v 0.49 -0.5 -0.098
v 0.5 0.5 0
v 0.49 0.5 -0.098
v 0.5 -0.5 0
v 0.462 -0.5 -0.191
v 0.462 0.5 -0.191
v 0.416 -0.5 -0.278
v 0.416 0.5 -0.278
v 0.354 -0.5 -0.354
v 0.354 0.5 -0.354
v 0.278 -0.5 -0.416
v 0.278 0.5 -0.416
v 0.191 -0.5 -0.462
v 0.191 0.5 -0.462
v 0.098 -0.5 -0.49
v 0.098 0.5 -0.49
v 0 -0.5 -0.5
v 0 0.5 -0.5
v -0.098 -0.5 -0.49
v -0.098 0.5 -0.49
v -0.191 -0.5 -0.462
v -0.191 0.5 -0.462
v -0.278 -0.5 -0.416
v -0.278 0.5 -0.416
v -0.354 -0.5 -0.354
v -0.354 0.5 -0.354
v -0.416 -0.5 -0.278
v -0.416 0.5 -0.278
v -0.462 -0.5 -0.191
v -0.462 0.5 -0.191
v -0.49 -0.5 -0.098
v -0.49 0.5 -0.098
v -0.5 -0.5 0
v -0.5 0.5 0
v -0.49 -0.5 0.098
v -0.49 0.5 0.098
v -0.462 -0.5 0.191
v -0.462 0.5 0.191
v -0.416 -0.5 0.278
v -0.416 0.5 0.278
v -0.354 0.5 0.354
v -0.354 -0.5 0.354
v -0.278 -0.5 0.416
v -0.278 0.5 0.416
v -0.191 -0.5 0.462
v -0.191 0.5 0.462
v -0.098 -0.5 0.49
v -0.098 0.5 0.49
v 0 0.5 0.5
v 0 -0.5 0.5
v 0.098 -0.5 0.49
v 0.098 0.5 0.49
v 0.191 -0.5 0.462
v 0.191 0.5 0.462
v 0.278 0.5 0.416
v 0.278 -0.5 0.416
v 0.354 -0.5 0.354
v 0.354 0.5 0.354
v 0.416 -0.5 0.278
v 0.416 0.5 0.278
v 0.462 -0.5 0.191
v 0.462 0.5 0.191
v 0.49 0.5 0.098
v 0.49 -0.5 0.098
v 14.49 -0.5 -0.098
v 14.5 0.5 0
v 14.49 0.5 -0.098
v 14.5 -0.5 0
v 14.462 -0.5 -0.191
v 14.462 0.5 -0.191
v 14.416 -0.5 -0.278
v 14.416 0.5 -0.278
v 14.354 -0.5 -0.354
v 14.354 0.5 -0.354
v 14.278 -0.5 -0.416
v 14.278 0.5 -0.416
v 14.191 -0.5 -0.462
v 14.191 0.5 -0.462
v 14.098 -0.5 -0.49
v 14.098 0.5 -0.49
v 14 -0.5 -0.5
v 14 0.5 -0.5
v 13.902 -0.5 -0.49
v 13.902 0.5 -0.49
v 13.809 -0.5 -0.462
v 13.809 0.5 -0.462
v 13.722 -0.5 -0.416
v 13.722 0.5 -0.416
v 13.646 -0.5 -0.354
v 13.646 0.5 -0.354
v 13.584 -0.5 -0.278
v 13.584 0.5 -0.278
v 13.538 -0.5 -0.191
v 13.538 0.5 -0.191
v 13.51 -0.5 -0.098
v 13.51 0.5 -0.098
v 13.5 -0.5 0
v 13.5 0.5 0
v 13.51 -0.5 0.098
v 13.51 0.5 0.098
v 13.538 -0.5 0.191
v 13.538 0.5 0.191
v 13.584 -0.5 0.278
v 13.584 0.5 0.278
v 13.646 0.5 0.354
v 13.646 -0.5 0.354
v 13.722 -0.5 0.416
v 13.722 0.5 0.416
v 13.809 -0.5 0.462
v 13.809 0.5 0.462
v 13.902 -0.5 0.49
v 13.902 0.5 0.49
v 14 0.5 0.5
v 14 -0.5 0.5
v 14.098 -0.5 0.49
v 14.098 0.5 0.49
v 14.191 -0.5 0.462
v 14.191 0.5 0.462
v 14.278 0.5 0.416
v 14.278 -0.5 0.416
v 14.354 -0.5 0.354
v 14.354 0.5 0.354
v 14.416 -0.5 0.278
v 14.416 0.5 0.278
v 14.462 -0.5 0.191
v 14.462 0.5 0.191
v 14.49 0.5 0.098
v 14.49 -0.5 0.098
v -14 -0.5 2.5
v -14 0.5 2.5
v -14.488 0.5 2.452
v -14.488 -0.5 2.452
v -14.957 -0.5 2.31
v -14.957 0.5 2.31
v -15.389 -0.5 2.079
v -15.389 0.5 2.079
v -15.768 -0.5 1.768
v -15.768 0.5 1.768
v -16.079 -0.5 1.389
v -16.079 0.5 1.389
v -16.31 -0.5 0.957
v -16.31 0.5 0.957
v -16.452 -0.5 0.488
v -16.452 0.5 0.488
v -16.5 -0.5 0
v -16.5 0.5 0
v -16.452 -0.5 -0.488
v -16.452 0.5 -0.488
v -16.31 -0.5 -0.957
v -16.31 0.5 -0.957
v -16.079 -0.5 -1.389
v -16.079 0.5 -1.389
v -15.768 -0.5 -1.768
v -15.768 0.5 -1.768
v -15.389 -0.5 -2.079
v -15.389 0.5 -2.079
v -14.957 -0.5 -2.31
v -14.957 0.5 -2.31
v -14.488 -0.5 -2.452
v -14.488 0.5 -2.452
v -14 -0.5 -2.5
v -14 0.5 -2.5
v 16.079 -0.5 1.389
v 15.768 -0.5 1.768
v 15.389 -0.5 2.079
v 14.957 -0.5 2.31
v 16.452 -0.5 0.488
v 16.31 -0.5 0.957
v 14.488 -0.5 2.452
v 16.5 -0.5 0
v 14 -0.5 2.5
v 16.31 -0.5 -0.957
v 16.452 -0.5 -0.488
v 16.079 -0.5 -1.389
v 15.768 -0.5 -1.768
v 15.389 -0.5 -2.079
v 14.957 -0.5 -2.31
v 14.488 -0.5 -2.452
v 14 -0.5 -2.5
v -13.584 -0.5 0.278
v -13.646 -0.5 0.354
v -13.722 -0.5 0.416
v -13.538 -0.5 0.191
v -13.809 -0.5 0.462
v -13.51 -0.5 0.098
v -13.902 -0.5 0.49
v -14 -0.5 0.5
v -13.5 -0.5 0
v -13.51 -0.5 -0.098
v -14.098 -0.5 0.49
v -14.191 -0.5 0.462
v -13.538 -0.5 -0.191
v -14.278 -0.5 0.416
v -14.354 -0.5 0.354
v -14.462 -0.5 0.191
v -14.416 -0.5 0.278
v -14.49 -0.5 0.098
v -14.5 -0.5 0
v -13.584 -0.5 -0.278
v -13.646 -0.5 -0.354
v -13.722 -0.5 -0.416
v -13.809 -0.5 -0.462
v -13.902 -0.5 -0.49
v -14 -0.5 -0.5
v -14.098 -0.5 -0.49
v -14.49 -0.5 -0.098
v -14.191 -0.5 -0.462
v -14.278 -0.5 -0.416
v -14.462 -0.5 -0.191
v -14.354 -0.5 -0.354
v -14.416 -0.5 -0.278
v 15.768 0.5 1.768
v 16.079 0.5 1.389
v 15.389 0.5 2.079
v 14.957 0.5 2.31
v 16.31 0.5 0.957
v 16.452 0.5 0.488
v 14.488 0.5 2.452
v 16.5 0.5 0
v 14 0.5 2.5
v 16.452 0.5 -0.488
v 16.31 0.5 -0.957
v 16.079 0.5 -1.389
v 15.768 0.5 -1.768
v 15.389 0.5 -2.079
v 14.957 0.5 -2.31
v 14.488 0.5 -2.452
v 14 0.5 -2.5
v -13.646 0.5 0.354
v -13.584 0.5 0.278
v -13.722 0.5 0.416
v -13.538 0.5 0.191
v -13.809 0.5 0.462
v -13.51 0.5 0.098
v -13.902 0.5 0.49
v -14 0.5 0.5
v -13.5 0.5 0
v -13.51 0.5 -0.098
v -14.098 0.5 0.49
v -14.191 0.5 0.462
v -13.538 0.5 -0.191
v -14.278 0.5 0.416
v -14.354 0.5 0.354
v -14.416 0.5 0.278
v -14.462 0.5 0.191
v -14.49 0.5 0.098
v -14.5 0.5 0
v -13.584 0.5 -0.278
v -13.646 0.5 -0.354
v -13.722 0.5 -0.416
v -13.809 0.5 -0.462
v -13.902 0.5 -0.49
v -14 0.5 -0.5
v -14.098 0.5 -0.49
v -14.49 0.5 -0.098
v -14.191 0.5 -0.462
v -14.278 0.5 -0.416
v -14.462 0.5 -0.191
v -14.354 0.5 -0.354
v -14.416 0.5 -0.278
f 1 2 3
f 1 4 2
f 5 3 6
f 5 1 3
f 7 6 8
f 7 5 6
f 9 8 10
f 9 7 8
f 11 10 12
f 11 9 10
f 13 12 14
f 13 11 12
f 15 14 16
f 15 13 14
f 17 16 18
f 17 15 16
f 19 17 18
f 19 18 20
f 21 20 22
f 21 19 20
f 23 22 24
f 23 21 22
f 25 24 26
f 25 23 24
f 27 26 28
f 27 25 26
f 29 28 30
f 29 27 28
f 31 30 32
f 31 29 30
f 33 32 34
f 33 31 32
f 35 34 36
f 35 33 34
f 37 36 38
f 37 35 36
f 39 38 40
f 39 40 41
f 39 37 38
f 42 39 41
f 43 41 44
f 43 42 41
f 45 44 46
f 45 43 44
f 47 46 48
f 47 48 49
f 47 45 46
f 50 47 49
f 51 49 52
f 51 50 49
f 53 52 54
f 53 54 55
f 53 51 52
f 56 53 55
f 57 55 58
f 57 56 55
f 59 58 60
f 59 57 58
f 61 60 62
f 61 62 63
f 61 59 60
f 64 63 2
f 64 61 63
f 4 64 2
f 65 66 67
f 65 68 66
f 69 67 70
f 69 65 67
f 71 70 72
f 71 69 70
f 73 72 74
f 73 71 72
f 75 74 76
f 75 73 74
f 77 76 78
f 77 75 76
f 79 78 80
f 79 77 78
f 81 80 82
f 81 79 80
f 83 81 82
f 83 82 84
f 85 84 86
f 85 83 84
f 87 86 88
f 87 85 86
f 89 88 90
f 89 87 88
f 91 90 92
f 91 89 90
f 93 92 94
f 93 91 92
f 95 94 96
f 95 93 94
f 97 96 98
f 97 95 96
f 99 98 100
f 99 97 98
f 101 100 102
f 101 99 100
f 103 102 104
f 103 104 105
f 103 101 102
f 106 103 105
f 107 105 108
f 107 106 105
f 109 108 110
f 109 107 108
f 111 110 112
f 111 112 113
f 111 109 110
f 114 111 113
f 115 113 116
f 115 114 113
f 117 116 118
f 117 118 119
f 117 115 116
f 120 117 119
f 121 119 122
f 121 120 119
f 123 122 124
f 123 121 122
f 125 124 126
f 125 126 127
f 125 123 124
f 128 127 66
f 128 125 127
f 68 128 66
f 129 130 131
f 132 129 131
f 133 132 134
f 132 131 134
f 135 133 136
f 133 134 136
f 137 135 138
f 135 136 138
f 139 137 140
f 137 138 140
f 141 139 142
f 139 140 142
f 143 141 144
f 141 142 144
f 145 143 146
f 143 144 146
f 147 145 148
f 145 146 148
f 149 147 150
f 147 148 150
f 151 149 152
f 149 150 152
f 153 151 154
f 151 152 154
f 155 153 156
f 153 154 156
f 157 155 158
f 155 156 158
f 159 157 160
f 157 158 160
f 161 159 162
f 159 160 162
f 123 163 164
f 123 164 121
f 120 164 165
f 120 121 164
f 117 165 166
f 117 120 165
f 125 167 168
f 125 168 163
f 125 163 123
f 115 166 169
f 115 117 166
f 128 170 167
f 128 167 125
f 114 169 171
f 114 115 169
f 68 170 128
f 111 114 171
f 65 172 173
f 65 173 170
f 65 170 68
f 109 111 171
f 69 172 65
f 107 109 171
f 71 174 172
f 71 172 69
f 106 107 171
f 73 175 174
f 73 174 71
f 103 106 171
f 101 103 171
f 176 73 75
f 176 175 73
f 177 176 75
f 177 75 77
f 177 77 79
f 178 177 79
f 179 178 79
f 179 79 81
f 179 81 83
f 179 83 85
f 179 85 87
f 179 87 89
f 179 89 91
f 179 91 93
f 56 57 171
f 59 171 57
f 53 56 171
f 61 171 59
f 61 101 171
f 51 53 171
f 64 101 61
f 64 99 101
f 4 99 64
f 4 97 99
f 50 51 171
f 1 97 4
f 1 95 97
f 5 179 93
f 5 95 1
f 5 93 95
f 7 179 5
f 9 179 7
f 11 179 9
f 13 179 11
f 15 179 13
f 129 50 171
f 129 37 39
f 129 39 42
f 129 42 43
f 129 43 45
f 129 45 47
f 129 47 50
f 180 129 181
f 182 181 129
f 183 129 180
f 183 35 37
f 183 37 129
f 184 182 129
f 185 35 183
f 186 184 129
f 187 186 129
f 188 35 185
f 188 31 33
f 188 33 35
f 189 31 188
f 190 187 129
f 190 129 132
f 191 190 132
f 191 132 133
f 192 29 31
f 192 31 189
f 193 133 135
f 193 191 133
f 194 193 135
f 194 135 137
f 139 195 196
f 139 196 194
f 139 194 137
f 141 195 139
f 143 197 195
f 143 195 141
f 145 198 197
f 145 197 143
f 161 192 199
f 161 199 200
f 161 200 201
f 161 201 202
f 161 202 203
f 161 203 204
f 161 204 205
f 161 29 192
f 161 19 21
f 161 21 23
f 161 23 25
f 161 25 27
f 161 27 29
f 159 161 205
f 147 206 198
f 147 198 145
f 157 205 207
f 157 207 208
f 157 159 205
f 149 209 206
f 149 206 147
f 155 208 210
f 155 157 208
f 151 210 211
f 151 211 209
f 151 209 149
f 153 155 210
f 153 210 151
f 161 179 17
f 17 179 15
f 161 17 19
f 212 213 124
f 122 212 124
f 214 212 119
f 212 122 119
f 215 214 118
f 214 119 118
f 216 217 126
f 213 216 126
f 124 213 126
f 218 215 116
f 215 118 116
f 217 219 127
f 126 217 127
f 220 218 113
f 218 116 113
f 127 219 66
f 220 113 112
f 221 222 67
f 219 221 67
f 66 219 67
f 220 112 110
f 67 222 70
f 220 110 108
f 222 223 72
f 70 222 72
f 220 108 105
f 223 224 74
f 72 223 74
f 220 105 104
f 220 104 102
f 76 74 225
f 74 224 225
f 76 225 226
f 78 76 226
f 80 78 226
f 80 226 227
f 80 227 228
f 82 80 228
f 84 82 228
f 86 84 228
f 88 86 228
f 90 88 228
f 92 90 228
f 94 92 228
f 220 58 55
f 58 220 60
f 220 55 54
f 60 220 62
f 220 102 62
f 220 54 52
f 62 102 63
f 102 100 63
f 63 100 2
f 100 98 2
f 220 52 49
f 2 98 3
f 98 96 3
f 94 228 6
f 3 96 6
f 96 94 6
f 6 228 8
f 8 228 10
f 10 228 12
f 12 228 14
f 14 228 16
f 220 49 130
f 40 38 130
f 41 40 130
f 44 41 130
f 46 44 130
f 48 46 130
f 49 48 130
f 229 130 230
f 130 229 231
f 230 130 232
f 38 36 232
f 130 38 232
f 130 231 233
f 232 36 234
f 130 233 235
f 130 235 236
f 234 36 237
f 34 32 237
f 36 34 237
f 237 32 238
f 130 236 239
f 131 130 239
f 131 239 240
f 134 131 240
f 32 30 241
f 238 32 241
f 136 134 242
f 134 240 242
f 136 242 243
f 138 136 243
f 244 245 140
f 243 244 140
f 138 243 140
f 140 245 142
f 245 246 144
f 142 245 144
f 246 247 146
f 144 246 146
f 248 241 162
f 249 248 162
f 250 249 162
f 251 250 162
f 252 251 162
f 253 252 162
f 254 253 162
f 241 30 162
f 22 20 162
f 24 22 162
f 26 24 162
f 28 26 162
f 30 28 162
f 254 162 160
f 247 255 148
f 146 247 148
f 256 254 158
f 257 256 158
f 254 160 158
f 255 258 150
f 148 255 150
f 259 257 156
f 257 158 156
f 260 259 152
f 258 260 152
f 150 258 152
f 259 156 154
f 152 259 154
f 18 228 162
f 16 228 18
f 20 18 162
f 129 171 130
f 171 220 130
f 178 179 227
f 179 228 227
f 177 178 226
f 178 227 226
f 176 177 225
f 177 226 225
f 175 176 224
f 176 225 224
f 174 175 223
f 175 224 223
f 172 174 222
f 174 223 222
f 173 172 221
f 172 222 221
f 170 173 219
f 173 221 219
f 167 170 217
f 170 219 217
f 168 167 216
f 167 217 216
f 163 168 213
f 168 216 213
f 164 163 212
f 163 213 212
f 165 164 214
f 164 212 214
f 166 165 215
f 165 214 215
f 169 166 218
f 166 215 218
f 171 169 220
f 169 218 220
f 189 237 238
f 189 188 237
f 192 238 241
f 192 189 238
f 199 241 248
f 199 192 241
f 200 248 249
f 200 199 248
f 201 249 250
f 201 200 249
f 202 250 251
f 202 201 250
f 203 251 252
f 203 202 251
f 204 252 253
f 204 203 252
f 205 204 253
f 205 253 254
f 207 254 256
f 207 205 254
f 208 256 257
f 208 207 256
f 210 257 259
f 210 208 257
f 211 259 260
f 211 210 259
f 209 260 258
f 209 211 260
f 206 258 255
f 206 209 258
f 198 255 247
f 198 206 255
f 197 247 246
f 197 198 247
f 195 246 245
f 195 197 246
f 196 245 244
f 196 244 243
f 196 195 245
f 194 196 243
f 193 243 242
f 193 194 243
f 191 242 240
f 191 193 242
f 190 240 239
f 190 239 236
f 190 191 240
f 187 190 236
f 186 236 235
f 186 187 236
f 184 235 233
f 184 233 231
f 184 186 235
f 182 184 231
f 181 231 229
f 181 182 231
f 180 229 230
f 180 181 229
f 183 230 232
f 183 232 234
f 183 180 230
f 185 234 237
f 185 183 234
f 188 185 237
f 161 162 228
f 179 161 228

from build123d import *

# Parameters (mm, degrees)
SCHIZZO1_R                   = 0.5
ESTRUSIONE_ESTRUSIONE3_DEPTH = 0.5


with BuildPart() as part:
    # Schizzo1 → Estrusione-Estrusione3 (new body, symmetric)
    with BuildSketch(Plane(origin=(0, 0, 0), x_dir=(1, 0, 0), z_dir=(0, 1, 0))):
        with BuildLine():
            Line((-14, 2.5), (14, 2.5))
            ThreePointArc((14, 2.5), (16.5, 0), (14, -2.5))
            Line((14, -2.5), (-14, -2.5))
            ThreePointArc((-14, -2.5), (-16.5, 0), (-14, 2.5))
        make_face()
        Circle(SCHIZZO1_R, mode=Mode.SUBTRACT)
        with Locations((-14, 0)):
            Circle(SCHIZZO1_R, mode=Mode.SUBTRACT)
        with Locations((14, 0)):
            Circle(SCHIZZO1_R, mode=Mode.SUBTRACT)
    extrude(amount=ESTRUSIONE_ESTRUSIONE3_DEPTH, both=True)


solid = part.part
